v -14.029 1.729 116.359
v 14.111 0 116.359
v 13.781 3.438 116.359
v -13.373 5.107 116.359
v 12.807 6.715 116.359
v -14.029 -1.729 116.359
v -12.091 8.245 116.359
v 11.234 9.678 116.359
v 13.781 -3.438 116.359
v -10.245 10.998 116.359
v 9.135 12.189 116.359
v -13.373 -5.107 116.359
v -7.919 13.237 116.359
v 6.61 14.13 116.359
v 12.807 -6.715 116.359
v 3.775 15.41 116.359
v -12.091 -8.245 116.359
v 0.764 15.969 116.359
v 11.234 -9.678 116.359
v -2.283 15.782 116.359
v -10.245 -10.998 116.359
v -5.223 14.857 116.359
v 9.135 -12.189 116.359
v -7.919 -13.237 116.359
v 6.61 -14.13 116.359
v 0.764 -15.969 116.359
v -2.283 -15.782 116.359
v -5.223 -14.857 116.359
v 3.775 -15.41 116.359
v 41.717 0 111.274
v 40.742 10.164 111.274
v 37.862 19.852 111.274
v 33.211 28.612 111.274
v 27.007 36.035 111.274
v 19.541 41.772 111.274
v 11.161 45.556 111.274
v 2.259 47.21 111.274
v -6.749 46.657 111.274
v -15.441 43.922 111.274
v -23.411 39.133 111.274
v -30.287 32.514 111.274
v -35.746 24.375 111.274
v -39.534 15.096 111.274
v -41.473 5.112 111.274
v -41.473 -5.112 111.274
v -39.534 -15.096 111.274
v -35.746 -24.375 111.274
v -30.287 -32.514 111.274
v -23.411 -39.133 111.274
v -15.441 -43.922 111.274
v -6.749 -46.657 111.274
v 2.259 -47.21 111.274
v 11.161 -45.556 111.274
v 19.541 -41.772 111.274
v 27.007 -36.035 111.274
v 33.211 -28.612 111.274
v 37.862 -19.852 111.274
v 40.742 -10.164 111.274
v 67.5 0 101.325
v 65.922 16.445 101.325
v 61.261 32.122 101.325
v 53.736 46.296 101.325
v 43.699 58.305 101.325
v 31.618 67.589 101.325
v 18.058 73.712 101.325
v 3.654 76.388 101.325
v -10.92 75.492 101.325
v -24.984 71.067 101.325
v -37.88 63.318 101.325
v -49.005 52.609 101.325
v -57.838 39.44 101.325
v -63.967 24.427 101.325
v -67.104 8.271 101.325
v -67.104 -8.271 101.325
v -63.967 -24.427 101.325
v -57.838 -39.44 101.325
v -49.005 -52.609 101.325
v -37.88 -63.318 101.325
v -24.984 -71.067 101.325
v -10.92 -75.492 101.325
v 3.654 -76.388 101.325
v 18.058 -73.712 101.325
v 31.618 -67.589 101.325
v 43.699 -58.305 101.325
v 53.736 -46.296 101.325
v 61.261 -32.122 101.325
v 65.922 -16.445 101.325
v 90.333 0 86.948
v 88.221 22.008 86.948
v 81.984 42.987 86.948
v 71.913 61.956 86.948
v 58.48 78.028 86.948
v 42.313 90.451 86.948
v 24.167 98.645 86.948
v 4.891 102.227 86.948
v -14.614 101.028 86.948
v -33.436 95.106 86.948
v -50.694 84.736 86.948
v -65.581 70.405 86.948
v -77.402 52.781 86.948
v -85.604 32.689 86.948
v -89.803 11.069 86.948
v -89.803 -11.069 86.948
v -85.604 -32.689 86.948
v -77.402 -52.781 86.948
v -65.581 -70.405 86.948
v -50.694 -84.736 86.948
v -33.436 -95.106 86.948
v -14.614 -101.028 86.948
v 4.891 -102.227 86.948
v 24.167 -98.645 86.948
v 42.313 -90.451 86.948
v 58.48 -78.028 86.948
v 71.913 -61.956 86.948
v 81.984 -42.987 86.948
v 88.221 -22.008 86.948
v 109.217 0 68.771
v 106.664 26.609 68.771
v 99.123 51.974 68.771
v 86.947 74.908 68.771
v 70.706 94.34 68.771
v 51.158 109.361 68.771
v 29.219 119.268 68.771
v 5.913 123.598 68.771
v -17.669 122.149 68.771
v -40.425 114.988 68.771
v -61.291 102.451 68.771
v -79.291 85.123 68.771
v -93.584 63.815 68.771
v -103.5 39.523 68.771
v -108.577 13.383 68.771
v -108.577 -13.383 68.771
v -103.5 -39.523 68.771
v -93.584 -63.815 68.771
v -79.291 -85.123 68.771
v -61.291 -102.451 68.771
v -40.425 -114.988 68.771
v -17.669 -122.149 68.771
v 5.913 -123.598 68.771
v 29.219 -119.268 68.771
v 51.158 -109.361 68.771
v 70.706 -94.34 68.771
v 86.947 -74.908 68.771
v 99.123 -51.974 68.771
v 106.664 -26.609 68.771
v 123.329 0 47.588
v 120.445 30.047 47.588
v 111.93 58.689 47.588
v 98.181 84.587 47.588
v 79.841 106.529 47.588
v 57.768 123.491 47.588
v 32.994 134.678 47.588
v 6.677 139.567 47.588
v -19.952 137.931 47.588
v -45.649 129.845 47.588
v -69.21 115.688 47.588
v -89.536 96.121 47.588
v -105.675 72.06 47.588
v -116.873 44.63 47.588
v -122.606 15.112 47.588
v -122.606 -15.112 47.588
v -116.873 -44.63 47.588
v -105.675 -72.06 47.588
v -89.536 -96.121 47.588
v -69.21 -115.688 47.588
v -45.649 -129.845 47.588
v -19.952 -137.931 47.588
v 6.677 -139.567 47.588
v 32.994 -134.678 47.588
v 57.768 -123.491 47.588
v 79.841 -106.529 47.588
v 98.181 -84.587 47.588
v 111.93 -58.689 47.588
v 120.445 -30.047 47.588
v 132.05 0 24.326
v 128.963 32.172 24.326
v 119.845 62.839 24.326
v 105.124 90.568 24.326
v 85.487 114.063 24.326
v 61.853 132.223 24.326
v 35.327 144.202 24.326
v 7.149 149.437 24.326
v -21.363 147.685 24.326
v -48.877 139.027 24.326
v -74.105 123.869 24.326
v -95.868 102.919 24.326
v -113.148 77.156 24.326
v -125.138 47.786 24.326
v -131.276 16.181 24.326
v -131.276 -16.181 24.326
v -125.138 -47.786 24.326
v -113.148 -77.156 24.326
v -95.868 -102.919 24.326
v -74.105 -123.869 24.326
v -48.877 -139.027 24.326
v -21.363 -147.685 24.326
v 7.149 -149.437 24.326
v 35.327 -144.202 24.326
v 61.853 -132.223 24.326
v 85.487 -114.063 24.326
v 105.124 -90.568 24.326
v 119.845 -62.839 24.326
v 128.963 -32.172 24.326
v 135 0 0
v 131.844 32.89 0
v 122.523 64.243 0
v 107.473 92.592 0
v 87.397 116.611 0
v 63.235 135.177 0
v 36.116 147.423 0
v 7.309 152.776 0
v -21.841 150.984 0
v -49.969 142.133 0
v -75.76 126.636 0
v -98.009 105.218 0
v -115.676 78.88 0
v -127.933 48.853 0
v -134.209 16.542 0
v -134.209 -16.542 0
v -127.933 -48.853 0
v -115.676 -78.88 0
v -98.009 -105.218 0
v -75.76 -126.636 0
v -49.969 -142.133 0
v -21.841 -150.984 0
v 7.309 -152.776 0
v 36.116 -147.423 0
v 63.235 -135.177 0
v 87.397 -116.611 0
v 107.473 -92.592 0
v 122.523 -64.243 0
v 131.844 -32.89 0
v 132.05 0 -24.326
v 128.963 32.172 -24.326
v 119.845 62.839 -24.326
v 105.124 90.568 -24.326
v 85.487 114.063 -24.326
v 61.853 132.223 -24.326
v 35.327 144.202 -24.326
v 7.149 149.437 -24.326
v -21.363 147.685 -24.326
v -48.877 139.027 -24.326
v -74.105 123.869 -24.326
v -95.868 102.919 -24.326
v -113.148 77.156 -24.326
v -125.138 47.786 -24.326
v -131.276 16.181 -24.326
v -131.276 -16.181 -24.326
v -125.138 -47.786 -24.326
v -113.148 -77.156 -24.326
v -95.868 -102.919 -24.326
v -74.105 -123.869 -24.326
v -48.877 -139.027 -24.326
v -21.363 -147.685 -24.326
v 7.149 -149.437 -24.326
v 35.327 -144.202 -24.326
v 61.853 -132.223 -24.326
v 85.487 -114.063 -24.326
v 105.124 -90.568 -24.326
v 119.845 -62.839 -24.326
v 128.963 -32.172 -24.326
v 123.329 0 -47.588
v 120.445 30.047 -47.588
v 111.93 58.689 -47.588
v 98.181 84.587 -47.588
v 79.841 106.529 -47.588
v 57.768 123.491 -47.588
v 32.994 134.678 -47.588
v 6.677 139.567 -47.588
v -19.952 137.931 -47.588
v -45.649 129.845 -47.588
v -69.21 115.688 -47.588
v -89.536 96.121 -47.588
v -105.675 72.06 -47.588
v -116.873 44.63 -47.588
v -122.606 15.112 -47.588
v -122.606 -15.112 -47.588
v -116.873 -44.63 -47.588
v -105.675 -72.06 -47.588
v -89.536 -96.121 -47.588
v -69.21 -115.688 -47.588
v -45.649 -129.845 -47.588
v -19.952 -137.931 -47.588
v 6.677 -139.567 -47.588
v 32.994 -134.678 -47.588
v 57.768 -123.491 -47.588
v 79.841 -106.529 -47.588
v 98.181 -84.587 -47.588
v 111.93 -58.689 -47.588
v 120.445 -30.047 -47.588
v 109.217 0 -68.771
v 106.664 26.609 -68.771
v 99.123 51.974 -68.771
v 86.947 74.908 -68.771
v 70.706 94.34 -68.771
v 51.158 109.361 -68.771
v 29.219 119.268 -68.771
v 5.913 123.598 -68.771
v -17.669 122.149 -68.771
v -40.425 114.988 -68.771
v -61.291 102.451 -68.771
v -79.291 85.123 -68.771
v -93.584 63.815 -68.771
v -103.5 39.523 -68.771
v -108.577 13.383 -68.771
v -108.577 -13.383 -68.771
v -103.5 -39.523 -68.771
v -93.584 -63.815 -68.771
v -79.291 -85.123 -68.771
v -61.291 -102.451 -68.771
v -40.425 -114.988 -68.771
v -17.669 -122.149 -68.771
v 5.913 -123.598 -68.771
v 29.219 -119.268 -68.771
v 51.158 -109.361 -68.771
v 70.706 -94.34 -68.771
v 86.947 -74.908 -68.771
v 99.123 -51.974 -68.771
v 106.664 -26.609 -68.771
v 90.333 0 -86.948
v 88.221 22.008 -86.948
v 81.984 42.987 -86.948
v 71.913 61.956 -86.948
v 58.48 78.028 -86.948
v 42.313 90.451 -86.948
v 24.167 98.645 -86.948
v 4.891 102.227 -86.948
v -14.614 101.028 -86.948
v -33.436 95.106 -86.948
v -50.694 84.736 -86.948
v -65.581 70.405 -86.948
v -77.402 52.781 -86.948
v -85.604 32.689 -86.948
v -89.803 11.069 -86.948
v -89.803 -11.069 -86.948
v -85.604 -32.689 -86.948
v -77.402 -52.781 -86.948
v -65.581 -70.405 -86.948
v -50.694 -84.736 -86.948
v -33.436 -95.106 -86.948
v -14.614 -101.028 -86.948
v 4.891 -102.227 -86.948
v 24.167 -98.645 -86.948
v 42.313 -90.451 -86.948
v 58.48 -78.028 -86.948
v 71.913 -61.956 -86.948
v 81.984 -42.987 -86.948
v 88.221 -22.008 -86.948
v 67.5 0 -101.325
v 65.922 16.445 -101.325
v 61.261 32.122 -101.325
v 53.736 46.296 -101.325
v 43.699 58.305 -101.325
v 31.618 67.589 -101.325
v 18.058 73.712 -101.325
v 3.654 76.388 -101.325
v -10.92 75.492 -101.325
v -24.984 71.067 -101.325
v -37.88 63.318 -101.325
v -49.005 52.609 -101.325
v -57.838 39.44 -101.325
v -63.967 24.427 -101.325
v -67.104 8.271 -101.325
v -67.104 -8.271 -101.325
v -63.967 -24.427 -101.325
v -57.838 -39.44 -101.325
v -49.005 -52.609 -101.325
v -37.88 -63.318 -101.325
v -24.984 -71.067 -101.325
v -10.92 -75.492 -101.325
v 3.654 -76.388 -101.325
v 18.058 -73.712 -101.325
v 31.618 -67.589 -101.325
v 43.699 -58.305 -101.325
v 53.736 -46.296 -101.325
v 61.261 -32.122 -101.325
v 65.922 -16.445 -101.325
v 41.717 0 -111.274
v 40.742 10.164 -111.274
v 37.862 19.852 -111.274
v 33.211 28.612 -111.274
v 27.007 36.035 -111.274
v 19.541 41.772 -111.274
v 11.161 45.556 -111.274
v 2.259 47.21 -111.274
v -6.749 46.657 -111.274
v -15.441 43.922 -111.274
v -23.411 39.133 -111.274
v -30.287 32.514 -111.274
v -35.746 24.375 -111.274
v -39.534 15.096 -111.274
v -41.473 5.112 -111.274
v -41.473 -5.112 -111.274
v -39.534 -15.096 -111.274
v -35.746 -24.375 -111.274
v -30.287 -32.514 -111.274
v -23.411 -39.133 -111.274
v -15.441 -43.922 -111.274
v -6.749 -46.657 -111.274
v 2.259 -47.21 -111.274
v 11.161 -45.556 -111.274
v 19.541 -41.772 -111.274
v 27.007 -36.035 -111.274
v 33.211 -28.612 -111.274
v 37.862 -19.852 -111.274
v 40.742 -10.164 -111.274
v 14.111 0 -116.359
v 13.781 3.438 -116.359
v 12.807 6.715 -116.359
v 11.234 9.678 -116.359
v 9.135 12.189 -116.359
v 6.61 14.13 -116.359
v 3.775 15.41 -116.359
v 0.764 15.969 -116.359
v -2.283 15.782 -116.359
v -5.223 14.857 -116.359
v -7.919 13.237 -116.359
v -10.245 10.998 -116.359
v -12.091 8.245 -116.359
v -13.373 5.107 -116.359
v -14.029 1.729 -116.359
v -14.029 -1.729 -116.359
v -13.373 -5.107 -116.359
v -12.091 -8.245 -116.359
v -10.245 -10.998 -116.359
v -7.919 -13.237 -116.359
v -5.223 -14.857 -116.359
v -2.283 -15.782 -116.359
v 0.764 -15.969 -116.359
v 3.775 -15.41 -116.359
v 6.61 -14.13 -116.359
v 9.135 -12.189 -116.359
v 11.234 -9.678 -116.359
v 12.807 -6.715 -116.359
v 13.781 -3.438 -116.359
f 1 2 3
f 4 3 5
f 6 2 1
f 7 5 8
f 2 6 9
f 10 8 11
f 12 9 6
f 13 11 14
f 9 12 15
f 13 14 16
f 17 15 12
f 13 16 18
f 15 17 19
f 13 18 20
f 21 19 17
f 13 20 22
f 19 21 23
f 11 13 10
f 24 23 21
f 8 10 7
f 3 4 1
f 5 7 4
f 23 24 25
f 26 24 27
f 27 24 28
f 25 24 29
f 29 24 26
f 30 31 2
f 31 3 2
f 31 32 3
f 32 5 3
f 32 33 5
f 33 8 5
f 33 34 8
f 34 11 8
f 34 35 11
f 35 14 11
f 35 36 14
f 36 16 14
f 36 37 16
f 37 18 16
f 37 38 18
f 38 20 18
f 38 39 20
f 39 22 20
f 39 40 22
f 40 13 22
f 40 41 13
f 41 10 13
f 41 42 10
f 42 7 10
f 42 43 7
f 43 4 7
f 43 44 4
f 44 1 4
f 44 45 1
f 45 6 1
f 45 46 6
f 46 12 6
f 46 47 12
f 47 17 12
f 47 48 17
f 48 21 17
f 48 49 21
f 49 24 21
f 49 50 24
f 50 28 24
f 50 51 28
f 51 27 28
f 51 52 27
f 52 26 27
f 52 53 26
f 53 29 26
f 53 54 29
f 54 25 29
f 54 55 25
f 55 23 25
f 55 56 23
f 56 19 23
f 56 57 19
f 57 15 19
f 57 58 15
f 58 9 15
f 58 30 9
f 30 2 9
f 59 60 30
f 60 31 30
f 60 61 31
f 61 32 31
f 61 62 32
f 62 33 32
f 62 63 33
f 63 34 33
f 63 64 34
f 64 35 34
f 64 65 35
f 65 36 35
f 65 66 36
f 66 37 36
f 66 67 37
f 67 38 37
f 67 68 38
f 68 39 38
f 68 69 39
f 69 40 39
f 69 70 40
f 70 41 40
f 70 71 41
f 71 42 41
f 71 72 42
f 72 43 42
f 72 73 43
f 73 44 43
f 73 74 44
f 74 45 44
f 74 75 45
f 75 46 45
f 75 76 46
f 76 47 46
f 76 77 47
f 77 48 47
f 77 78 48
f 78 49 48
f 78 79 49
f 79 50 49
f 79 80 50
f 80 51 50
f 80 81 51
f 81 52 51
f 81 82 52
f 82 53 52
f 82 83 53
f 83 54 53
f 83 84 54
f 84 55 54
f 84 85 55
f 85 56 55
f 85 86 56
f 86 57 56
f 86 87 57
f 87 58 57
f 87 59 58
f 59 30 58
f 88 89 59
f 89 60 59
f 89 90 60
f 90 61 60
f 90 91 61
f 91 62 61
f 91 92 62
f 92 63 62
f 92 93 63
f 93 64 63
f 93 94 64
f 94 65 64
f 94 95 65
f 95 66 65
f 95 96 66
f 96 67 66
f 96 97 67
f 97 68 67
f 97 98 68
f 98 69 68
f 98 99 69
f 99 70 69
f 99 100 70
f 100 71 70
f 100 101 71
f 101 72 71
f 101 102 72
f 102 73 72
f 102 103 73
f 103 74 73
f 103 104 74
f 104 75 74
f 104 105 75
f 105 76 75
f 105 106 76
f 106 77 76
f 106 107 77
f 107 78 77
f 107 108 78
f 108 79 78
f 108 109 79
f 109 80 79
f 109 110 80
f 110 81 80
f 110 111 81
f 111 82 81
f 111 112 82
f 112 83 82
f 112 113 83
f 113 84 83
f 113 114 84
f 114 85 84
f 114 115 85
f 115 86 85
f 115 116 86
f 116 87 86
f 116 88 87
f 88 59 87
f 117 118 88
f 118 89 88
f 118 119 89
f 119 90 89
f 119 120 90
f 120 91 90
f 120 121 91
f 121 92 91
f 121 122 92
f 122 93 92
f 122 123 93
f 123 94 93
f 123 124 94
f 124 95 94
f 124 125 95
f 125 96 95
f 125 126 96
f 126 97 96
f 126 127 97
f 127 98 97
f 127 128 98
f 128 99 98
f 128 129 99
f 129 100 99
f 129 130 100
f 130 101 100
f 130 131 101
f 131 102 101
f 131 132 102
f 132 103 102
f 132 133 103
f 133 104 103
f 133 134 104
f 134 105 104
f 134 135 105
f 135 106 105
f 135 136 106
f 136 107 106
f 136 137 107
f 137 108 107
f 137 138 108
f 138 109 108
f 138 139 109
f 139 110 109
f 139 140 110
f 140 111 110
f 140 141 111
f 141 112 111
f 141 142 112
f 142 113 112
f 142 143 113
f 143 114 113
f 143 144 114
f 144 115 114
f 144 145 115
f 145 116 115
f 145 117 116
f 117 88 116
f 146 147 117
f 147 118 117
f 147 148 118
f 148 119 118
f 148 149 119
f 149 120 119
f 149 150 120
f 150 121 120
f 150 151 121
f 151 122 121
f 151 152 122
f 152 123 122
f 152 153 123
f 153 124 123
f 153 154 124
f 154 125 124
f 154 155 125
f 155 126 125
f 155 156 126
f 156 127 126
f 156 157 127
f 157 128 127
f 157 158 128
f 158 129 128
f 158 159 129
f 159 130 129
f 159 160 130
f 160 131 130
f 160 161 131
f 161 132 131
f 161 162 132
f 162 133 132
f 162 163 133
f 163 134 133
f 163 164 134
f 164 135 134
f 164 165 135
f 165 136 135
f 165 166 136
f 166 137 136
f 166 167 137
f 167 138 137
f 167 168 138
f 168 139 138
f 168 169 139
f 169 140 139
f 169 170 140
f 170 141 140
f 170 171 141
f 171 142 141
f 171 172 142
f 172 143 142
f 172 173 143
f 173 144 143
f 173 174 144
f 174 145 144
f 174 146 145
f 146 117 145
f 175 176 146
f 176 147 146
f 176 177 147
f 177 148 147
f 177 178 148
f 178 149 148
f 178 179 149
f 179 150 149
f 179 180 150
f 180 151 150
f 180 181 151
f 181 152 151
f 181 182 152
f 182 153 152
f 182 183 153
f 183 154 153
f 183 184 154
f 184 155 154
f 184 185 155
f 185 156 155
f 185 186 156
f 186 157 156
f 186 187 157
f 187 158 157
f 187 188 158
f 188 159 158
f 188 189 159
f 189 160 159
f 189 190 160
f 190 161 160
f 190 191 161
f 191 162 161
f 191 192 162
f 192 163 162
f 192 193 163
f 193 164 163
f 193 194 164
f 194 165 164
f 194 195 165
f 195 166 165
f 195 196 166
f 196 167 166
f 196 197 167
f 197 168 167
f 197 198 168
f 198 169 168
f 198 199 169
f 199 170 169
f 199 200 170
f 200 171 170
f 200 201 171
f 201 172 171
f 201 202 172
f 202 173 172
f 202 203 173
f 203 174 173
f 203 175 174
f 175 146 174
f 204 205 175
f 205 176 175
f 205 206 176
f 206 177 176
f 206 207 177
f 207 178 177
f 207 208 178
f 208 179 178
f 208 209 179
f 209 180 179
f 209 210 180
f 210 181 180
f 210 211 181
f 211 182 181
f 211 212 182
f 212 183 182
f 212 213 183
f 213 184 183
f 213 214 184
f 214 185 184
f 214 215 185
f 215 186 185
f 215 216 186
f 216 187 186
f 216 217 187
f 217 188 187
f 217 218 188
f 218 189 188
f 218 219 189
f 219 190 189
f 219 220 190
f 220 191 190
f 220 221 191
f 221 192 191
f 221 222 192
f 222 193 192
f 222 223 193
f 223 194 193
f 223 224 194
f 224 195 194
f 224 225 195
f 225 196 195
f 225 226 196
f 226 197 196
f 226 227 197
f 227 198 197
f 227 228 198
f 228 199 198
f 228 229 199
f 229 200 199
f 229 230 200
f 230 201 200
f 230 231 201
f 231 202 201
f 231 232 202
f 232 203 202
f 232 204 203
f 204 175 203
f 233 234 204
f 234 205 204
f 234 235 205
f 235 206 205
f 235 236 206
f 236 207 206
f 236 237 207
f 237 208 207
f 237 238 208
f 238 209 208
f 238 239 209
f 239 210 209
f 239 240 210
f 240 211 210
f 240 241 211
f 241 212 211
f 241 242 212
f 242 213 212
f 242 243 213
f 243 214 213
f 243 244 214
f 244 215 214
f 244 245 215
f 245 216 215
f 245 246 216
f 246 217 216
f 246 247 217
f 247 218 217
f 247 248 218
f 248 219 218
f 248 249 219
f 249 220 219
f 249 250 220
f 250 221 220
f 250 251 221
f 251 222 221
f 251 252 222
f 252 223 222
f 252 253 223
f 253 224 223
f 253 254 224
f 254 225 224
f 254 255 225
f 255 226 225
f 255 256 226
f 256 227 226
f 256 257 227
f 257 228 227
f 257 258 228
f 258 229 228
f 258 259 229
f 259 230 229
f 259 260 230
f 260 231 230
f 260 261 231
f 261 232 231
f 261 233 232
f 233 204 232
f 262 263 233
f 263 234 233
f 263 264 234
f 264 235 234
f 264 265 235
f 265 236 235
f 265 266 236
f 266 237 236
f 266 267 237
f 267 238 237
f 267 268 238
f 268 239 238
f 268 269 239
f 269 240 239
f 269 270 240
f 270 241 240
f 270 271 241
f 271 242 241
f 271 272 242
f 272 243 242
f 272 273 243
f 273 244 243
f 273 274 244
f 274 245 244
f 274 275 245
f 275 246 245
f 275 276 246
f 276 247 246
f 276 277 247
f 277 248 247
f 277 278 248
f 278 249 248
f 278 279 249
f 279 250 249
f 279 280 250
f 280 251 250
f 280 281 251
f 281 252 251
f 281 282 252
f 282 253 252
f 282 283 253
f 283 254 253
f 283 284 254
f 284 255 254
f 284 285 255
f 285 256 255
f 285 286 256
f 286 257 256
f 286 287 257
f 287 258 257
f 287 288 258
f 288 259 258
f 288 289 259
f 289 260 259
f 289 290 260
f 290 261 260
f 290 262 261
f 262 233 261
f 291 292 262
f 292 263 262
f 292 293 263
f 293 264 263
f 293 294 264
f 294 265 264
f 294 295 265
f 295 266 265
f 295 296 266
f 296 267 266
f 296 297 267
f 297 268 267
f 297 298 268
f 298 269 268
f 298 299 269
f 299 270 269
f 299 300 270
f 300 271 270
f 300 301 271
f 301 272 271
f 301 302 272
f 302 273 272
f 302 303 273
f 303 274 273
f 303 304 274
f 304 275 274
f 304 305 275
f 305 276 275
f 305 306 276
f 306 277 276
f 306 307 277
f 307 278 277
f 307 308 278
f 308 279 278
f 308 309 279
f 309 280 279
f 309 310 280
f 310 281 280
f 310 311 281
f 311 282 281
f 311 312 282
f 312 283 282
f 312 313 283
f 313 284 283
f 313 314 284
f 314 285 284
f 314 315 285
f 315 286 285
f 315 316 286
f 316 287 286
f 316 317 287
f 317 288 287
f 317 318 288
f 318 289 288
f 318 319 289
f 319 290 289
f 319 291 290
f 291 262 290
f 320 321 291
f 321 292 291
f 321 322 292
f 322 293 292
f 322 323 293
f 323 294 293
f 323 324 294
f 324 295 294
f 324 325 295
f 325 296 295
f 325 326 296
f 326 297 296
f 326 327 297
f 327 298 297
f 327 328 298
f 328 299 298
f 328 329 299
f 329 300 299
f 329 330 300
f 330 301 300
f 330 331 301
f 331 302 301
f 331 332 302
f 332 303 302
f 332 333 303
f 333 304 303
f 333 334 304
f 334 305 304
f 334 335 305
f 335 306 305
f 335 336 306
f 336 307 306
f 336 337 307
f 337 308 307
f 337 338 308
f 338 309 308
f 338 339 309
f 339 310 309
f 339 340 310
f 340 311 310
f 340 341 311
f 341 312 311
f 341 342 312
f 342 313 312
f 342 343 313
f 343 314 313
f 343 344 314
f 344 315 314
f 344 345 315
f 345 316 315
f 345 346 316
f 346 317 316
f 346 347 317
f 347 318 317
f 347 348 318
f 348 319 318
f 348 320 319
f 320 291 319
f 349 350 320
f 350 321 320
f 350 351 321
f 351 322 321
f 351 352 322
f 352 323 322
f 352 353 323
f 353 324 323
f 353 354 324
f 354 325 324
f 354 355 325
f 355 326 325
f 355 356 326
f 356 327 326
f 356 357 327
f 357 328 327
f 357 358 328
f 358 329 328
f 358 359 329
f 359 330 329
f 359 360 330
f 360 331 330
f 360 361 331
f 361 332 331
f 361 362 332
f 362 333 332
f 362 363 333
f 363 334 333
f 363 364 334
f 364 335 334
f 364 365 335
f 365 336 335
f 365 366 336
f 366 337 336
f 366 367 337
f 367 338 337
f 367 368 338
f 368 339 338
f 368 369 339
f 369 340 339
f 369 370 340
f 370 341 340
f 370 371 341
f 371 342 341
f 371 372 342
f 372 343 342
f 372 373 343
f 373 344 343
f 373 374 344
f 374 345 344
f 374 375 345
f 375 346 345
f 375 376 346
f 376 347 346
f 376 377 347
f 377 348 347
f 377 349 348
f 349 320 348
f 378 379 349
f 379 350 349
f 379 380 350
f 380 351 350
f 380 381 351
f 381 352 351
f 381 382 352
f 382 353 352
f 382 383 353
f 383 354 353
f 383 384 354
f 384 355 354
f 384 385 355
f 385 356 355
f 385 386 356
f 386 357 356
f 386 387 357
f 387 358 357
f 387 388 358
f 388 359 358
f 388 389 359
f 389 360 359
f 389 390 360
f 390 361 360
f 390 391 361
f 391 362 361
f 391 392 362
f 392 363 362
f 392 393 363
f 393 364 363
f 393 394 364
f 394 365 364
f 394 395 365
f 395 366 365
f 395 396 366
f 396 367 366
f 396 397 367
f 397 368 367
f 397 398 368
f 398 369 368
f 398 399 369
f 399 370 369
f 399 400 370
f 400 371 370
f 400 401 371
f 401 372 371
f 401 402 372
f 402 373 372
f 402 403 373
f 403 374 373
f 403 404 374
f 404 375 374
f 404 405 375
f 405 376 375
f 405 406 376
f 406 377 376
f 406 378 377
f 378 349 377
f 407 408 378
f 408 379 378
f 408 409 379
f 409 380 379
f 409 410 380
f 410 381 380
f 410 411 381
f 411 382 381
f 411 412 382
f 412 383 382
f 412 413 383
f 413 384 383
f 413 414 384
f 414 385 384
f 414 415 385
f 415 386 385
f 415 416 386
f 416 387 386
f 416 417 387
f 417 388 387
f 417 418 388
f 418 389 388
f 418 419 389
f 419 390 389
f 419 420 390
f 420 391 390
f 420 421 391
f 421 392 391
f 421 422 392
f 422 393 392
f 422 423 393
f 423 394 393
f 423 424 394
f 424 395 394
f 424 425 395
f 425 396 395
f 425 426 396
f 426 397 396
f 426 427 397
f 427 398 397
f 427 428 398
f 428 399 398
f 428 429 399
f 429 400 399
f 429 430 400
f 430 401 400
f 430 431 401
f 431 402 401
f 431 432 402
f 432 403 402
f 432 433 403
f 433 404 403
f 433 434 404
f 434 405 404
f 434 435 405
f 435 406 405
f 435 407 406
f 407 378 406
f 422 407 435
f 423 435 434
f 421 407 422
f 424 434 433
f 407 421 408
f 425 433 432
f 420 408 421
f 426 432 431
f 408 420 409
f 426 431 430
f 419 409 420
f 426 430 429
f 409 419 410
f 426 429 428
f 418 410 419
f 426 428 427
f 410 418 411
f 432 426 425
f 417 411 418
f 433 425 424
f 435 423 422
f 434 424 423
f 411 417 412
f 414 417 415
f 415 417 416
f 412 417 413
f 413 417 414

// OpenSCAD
// Generated by SolidPython 1.0.1 on 2020-07-29 00:46:52


scale(v = [15, 17, 13]) {
	sphere(r = 9);
}
/***********************************************
*********      SolidPython code:      **********
************************************************
 
# import packages: SolidPython
from solid import *
from solid.utils import *
from itertools import chain, combinations, permutations


class Resize:

    def __init__(self, scad_file):
        self.scad_file = scad_file
        #self.scad_file = import_scad(scad_file)
        # cone/cylinder param:
        self.r1 = 0
        self.r2 = 0
        self.h = 0
        # rectangular prism param:
        self.w = 0
        self.l = 0
        # ellipse param:
        self.r = 0

    # import OpenScad code (file name corresponds to shape)


    # classify shape + parameters
    def assign(self, param1, param2, param3):
        if self.scad_file == 'cone.scad':
            self.r1 = param1
            self.r2 = param2
            self.h = param3
        elif self.scad_file == 'cylinder.scad':
            self.r1 = param1
            self.r2 = param2
            self.h = param3
        elif self.scad_file == 'rectangularPrism.scad':
            self.h = param1
            self.l = param2
            self.w = param3
        else:
            self.r = param1
            self.h = param2

    # resize parameters
    def iterate(self):
        x = range(3, 20, 2)
        i = 1
        if self.scad_file == 'cone.scad':
            tempList = list(permutations(x, 2))
            for temp in tempList:
                param1 = temp[0]
                param2 = temp[1]
                filepath = 'produced_scad_files/' + 'cone' + str(param1) + '_' + str(param2) + '_' + '.scad'
                scad_render_to_file(cylinder(h=param1, r1=param2, r2=0), filepath)

        elif self.scad_file == 'cylinder.scad':
            tempList = list(permutations(x, 3))
            for temp in tempList:
                param1 = temp[0]
                param2 = temp[1]
                filepath = 'produced_scad_files/' + 'cylinder' + str(param1) + '_' + str(param2) + '_' + '.scad'
                scad_render_to_file(cylinder(h=param1, r1=param2, r2=param2), filepath)

        elif self.scad_file == 'rectangularPrism.scad':
            tempList = list(permutations(x, 3))
            for temp in tempList:
                param1 = temp[0]
                param2 = temp[1]
                param3 = temp[2]
                filepath = 'produced_scad_files/' + 'rectangularPrism' + str(param1) + '_' + str(param2) + '_' + str(
                    param3) + '.scad'
                scad_render_to_file(cube(size=(param1, param2, param3)), filepath)

        elif self.scad_file == 'ellipse.scad':
            tempList = list(permutations(x, 4))
            for temp in tempList:
                param1 = temp[0]
                param2 = temp[1]
                param3 = temp[2]
                param4 = temp[3]
                filepath = 'produced_scad_files/' + 'ellipse' + str(param1) + '_' + str(param2) + '_' + str(param3) + '_' + str(param4) + '.scad'
                scad_render_to_file(scale([param1, param2, param3])(sphere(r=param4)), filepath)

    def render_to_scadfile(self):
        scad_render_to_file(scad, 'example.scad') 
 
************************************************/
